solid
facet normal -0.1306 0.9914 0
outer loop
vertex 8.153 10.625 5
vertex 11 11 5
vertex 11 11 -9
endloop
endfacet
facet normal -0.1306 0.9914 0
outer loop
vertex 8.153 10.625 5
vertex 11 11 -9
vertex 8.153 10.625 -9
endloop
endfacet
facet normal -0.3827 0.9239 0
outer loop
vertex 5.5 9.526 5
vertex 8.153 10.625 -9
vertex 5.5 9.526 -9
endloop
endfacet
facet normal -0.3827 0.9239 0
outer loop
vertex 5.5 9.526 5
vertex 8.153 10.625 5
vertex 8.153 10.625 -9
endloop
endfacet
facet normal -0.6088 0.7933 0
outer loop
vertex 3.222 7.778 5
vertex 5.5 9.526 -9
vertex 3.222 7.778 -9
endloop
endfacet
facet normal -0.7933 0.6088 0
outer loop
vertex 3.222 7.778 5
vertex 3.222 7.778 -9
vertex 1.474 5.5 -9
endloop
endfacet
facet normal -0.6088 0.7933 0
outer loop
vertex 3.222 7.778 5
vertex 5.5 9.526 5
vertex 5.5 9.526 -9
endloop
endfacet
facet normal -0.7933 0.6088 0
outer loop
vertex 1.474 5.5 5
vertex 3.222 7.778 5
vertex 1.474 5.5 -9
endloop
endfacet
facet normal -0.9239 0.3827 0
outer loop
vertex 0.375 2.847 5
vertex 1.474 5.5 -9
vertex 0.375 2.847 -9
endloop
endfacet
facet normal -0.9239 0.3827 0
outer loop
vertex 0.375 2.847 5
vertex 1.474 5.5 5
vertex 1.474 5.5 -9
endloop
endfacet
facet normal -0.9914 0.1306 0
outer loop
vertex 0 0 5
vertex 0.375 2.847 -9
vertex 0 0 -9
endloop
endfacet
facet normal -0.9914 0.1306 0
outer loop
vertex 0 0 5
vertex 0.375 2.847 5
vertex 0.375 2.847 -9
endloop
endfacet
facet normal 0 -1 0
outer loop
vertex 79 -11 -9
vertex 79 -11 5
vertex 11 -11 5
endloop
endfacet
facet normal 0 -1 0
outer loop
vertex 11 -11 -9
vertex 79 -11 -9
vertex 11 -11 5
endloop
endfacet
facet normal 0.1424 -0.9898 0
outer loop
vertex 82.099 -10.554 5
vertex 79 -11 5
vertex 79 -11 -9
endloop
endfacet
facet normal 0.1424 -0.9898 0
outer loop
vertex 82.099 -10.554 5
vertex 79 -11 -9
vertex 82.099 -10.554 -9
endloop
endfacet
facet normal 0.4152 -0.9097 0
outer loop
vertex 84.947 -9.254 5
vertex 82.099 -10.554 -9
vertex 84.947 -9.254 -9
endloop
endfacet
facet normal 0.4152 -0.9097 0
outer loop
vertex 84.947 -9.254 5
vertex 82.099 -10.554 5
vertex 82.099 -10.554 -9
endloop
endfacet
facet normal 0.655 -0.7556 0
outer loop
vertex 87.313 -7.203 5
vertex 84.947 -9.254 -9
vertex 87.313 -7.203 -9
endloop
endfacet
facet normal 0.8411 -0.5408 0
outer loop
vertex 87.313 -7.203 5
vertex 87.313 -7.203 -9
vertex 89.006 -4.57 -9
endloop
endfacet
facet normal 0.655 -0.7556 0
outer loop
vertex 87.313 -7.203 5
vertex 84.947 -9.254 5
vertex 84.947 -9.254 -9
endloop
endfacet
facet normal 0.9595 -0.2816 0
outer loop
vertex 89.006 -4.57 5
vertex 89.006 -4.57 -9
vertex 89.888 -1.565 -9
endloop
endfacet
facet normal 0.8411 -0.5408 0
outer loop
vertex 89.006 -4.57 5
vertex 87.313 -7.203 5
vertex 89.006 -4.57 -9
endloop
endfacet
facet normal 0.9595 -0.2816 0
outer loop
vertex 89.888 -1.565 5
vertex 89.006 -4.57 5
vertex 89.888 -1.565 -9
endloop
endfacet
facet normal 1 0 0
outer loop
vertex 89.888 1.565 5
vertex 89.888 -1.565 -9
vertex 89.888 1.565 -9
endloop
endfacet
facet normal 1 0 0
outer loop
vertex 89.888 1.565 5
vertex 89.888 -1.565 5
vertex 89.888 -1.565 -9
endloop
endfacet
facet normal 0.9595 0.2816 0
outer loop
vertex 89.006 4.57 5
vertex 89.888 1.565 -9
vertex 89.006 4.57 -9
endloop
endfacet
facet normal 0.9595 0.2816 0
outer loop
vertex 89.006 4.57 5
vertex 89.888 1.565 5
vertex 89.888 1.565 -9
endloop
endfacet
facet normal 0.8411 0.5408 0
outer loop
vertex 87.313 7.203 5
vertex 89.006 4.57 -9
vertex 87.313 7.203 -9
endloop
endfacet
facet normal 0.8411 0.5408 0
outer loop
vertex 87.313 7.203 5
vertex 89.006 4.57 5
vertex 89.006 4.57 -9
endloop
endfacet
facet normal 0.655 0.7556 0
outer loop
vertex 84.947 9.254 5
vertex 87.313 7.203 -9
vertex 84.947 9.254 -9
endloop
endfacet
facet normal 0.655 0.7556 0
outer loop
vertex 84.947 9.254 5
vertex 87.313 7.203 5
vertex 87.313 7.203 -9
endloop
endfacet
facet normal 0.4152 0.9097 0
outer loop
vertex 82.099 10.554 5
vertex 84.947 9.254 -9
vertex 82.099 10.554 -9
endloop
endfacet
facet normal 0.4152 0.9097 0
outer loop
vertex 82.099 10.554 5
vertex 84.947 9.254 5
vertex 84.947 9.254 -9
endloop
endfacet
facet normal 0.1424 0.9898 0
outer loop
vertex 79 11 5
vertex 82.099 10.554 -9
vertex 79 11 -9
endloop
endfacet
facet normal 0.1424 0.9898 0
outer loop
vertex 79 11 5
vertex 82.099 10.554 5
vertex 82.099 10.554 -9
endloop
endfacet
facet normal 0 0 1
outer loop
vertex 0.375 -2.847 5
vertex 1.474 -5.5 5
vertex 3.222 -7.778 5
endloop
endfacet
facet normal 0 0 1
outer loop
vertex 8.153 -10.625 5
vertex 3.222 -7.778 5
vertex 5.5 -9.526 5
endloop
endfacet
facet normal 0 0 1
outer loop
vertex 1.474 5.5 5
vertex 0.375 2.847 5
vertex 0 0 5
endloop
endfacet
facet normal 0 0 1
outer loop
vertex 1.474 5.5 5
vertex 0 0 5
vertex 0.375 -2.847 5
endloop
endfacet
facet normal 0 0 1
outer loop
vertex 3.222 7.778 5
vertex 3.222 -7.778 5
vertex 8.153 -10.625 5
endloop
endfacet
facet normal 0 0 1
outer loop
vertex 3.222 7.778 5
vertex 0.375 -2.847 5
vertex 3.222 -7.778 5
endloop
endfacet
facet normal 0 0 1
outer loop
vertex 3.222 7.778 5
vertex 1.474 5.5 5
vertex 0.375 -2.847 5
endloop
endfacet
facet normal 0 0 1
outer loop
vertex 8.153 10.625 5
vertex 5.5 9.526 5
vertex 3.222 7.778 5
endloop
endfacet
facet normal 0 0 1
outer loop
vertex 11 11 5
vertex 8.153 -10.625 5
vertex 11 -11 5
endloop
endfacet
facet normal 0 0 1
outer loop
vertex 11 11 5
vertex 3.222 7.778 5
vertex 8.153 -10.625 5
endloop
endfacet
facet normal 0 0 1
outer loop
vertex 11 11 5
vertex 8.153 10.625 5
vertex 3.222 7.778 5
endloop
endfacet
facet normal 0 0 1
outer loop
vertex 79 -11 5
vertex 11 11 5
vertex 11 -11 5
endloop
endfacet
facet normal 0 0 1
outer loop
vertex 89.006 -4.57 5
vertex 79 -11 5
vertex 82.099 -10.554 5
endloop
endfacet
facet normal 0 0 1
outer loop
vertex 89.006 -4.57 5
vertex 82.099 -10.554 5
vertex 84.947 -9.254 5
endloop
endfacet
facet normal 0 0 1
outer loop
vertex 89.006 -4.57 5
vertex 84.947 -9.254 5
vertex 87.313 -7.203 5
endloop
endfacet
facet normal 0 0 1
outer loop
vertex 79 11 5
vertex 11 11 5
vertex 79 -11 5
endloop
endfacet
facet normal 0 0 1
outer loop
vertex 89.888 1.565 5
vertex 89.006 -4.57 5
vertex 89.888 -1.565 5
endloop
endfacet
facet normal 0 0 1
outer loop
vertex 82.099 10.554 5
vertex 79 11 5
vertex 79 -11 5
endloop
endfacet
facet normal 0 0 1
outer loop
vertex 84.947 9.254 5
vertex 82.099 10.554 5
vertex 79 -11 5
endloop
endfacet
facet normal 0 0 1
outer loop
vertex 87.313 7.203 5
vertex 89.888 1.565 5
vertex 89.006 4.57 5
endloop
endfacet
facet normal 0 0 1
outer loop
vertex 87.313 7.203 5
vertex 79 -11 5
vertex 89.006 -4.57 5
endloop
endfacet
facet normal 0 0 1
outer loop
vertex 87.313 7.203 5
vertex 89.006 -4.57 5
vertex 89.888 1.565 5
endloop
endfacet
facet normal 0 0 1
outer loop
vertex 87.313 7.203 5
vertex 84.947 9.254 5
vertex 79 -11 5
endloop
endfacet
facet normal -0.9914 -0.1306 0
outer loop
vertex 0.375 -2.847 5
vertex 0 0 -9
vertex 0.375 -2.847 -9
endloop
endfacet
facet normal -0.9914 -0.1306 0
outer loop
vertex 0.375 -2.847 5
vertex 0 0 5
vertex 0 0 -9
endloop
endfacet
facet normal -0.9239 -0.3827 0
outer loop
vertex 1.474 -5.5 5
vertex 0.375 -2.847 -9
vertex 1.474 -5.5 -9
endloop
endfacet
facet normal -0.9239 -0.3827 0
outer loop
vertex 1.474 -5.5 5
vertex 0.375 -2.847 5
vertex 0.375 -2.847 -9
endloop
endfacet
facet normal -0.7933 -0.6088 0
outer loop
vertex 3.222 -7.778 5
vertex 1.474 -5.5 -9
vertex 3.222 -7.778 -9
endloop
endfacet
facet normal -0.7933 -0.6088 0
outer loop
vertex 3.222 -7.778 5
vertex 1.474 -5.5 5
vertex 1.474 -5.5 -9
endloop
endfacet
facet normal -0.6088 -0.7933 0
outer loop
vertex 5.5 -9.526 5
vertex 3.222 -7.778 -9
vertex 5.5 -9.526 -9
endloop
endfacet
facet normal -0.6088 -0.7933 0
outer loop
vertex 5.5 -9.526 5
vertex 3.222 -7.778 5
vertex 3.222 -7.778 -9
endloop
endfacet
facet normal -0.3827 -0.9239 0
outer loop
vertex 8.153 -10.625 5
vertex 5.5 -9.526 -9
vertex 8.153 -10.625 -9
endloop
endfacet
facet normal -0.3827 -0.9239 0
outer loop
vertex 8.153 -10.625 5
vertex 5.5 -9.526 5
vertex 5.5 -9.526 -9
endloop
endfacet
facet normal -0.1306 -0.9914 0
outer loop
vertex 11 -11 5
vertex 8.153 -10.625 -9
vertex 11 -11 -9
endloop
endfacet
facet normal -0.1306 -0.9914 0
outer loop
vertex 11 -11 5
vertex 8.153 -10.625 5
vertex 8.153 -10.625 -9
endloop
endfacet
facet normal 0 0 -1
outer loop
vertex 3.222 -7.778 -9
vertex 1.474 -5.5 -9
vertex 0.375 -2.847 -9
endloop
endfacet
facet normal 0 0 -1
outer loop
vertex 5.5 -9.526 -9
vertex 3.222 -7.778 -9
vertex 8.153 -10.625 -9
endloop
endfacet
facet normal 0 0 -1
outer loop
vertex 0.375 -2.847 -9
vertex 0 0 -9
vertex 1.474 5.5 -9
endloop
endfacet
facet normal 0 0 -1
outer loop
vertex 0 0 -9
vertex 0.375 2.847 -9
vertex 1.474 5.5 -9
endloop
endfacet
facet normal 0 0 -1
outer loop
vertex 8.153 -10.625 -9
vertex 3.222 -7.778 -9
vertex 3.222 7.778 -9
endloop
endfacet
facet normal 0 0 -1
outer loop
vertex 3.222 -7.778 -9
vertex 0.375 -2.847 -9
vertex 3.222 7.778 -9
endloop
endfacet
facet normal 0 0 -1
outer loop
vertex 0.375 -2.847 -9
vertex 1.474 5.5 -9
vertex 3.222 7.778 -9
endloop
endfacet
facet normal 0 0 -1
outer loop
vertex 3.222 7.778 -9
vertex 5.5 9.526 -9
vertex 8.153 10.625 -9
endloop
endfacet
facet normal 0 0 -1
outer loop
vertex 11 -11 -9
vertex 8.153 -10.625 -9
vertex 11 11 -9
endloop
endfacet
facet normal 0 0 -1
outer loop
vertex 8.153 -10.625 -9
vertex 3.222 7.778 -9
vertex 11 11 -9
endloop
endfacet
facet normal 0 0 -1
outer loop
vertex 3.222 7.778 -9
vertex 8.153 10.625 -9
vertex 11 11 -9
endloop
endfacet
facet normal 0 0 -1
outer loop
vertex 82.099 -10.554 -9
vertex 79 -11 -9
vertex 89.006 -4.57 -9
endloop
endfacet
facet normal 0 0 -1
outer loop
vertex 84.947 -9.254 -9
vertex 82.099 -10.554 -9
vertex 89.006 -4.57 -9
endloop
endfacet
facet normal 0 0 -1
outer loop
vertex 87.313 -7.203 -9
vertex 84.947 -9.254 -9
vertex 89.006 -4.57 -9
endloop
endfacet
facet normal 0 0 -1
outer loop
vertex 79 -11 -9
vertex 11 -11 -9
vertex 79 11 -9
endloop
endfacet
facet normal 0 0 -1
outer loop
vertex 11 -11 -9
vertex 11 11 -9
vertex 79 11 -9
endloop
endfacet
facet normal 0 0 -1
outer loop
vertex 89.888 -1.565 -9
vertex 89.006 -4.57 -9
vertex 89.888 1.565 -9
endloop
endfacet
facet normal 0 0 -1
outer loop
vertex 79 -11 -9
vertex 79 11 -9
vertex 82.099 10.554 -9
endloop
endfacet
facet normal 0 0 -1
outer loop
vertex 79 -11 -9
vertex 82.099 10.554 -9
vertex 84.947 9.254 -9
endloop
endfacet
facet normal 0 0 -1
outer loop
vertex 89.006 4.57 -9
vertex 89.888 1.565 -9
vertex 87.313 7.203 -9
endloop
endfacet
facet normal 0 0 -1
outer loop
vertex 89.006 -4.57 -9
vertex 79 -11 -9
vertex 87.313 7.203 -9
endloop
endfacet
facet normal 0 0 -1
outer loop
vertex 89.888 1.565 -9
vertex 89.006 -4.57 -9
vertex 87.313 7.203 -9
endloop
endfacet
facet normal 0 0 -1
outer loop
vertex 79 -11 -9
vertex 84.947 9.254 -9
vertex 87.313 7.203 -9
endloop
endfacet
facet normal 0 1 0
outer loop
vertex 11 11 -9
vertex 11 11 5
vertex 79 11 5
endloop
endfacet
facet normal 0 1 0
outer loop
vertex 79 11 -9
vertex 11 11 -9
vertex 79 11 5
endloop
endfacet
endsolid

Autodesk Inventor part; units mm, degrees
sketch "Sketch1" plane through (0, 0, 0) normal (0, 0, 1) x (1, 0, 0)
  line L0 (11, 11) -> (79, 11)
  line L1 (79, -11) -> (11, -11)
  arc A0 (11, 11) -> (11, -11) centre (11, 0) ccw
  line L2 (0, 9.4) -> (0, -7.4) projected
  line L3 (-5, 0) -> (30, 0) projected
  arc A1 (79, -11) -> (79, 11) centre (79, 0) ccw
  line L4 (90, 0) -> (90, 7) construction
  dimension "d0" = 11
  dimension "d8" = 11
  dimension "d9" = 90
ref_plane "Work Plane1" through (0, 0, -9) normal (0, 0, 1) x (1, 0, 0)
ref_plane "Work Plane2" through (0, 0, 5) normal (0, 0, 1) x (1, 0, 0)
extrude "Body1" add sketch "Sketch1" against normal up to surface (14 mm away) from surface at 5
ref_plane "Work Plane3" through (90, 0, 5) normal (1, 0, 0) x (0, 1, 0)
equation "\"d0\" = 0.5 * PB"
equation "\"d8\" = 0.5 * PB"
equation "\"d9\" = NLG"
equation "\"d1\" = -PNT"
equation "\"d2\" = PH - PNT"
equation "\"NLG\" = 90"
equation "\"PB\" = 22"
equation "\"PNT\" = 9"
equation "\"PH\" = 14"
equation "\"RR\" = 0.001"
equation "\"WDMIN\" = 75"
equation "\"PHH\" = 0"
equation "\"WDMAX\" = 85"
equation "\"PUEB\" = 5.4"
properties part number "DIN 6885 - A 22 x 14 x 90" material "Steel, Mild"
